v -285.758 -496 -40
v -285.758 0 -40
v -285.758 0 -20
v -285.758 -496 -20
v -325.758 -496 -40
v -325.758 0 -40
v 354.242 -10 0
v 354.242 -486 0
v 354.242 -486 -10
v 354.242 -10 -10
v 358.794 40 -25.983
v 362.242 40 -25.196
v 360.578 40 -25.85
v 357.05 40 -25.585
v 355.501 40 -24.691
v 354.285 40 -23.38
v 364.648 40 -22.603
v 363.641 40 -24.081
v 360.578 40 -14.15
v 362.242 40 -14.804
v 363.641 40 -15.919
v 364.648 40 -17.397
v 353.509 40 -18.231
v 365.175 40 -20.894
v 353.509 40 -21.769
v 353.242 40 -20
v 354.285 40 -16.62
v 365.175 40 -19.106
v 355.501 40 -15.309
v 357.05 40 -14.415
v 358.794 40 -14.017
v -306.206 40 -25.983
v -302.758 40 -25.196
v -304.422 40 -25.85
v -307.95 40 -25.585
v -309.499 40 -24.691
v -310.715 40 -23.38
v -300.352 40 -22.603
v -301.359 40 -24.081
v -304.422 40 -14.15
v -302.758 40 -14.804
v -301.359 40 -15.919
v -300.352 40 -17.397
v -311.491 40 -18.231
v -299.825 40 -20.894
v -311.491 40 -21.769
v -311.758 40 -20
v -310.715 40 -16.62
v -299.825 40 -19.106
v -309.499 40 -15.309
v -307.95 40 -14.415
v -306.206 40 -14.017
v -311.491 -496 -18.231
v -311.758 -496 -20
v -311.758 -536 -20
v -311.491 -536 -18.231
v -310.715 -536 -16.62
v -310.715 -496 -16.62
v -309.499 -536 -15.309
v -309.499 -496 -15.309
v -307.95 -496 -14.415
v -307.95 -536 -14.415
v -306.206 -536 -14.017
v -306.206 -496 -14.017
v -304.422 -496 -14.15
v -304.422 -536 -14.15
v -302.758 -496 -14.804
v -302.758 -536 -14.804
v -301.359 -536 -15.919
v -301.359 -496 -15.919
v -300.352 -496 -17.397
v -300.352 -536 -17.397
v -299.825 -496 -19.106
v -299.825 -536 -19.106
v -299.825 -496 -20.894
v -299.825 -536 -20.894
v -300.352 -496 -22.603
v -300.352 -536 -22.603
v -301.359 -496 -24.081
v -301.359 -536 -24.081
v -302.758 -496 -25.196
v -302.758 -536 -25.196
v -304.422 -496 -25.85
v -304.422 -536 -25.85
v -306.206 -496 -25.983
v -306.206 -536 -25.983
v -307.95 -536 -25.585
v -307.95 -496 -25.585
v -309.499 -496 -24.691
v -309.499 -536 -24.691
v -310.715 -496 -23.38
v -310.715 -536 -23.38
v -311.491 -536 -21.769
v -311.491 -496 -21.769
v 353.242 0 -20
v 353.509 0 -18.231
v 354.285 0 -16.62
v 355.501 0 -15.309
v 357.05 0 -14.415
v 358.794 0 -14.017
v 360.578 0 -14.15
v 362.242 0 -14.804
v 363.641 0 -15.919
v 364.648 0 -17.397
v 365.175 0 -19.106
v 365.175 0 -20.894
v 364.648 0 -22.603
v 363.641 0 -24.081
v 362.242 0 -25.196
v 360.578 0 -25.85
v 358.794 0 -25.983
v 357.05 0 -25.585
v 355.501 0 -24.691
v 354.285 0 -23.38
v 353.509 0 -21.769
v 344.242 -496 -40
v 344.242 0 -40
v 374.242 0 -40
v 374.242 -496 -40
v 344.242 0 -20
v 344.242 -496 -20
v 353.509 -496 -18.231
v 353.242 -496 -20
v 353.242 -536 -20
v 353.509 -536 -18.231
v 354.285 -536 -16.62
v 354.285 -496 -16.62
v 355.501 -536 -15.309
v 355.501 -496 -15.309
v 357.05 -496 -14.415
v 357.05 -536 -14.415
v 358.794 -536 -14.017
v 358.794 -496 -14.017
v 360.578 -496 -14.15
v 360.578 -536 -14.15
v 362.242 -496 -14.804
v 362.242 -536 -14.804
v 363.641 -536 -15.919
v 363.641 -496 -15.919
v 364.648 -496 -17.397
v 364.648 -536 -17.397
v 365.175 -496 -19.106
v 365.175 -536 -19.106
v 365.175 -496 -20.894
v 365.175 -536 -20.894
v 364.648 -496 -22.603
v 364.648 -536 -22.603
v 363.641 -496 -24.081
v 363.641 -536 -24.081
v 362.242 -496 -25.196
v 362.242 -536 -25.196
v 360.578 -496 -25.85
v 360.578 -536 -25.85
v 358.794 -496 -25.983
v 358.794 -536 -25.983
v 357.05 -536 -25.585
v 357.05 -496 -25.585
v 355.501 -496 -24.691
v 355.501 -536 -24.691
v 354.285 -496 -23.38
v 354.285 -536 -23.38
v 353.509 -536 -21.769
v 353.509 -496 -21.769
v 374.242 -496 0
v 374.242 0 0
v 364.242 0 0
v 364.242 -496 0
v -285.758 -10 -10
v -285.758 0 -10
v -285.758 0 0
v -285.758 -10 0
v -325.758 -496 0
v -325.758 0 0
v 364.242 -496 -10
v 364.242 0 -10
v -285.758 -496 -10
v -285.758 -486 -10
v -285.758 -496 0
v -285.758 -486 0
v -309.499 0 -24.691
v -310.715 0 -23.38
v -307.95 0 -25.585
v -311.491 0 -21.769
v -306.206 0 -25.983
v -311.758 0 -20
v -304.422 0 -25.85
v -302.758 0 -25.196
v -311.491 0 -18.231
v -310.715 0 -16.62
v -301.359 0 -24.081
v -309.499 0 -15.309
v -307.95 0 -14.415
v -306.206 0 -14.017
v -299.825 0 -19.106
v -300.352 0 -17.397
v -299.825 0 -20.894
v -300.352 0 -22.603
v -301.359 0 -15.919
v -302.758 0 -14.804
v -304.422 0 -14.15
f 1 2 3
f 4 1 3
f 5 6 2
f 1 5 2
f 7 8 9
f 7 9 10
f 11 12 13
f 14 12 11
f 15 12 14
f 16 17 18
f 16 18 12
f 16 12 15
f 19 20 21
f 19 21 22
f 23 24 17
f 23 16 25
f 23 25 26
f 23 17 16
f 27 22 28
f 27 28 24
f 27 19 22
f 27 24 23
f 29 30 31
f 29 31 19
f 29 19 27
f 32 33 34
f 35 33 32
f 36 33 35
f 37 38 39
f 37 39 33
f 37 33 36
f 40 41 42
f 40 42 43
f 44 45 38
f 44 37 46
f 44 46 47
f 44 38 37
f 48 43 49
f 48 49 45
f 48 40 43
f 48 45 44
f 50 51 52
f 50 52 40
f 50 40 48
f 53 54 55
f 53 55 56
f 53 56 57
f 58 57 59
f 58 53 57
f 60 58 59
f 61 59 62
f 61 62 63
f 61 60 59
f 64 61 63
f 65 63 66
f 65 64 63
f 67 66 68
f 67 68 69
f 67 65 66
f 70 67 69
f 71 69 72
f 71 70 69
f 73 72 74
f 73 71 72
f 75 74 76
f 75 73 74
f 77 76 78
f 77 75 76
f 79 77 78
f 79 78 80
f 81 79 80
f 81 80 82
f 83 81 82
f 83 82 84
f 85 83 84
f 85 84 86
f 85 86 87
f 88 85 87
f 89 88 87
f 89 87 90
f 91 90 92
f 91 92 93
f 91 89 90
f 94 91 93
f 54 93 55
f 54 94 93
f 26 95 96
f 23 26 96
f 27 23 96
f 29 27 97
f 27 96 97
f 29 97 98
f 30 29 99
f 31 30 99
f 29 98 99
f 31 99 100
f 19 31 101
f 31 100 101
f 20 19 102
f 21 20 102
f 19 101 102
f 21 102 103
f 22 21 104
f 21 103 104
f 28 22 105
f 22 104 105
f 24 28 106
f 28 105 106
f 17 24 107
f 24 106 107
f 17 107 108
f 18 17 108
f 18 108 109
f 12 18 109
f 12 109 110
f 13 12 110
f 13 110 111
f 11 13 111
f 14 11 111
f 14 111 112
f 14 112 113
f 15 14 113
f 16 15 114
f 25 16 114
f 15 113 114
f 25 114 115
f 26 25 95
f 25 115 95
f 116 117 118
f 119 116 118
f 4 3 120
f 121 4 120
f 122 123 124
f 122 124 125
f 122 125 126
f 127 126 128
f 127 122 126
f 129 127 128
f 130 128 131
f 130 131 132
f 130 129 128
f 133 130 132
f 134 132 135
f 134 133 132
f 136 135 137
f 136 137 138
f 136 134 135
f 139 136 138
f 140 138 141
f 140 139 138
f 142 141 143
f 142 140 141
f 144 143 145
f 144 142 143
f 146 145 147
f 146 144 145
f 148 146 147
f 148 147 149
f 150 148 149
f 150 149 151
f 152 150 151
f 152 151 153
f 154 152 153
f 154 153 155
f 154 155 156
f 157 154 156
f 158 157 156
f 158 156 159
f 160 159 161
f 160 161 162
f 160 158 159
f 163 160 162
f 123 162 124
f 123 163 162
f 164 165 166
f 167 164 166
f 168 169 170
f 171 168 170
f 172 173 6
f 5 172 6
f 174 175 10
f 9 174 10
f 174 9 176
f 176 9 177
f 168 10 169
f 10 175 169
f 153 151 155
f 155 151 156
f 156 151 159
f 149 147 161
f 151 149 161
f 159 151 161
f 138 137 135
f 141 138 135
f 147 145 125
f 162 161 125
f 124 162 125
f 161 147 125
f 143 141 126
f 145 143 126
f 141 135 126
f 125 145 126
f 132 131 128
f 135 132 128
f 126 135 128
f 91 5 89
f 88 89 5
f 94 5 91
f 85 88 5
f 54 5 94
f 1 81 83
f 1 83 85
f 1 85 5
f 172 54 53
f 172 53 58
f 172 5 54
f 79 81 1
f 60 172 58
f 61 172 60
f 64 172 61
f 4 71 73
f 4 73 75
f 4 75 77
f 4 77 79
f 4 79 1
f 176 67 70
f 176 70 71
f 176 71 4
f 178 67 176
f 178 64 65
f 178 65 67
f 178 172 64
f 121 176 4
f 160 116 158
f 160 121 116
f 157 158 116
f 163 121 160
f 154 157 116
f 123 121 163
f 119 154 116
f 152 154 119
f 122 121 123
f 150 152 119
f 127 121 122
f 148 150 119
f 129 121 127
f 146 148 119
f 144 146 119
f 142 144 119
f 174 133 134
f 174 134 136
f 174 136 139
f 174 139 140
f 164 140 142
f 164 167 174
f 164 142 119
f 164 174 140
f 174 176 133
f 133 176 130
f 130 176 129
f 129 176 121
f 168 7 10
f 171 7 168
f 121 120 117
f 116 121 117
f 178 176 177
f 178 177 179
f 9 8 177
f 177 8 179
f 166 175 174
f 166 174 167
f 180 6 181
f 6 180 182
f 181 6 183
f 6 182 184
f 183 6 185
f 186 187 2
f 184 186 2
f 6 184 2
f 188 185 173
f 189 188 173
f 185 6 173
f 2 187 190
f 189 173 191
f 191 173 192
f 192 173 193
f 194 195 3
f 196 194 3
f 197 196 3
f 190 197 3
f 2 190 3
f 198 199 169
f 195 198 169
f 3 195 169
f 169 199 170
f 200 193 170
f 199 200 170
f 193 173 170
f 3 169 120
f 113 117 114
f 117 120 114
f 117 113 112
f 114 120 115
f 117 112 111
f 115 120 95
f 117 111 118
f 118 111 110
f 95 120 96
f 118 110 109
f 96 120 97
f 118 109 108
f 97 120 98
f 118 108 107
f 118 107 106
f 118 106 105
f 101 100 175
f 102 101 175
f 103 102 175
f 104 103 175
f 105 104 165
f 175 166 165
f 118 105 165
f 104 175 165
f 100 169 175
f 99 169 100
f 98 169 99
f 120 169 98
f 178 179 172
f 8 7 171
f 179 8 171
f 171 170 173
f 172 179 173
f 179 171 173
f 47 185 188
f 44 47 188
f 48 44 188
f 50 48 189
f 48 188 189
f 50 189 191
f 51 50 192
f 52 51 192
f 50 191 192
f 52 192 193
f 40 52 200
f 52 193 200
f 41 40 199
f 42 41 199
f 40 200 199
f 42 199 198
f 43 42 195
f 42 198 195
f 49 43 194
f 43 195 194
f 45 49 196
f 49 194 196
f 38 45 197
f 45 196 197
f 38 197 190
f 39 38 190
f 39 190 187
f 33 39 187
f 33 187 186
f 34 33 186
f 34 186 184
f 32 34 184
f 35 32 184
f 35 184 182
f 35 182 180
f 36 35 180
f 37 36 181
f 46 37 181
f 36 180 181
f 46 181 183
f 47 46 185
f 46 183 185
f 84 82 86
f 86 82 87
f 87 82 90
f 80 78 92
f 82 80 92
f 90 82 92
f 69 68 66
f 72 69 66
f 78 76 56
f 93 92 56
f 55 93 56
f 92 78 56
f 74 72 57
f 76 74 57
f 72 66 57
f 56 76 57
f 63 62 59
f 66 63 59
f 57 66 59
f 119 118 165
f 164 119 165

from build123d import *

# Parameters (mm, degrees)
F1_DEPTH = 496
F2_R     = 6
F3_DEPTH = 40
F5_W     = 650
F5_H     = 10
F6_DEPTH = 10
F7_W     = 10
F7_H     = 476
F8_DEPTH = 10


# Not quite as in the source:
# - a pattern or mirror of a feature is missing from the dataset's text; its kind, count and spacing are read off the source's solid


with BuildPart() as f1:
    # F0 (on Front) → F1 (new body)
    with BuildSketch(Plane.XZ):
        Polygon((374.2424272732, 0), (-325.7575727268, 0), (-325.7575727268, -40), (-285.7575727268, -40), (-285.7575727268, -20), (344.2424272732, -20), (344.2424272732, -40), (374.2424272732, -40), align=None)
    extrude(amount=F1_DEPTH)

    # F2 (on face) → F3 (join)
    with BuildSketch(Plane(origin=(0, 0, 0), x_dir=(-1, 0, 0), z_dir=(0, 1, 0))):
        with Locations((-359.2424272732, -20)):
            Circle(F2_R)
        with Locations((305.7575727268, -20)):
            Circle(F2_R)
    f3 = extrude(amount=F3_DEPTH)

    # F3_copies: F3 across plane
    add(f3.mirror(Plane(origin=(0, -248, 0), x_dir=(0, 0, -1), z_dir=(0, -1, 0))))

    # F5 (on face) → F6 (cut)
    with BuildSketch(Plane(origin=(0, 0, 0), x_dir=(-1, 0, 0), z_dir=(0, 1, 0))):
        with Locations((-39.2424272732, -5)):
            Rectangle(F5_W, F5_H)
    f6 = extrude(amount=-F6_DEPTH, mode=Mode.SUBTRACT)

    # F6_copies: F6 across plane
    add(f6.mirror(Plane(origin=(0, -248, 0), x_dir=(0, 0, -1), z_dir=(0, -1, 0))), mode=Mode.SUBTRACT)

    # F7 (on face) → F8 (cut)
    with BuildSketch(Plane.XY):
        with Locations((359.2424272732, -248)):
            Rectangle(F7_W, F7_H)
    extrude(amount=-F8_DEPTH, mode=Mode.SUBTRACT)


solid = f1.part
